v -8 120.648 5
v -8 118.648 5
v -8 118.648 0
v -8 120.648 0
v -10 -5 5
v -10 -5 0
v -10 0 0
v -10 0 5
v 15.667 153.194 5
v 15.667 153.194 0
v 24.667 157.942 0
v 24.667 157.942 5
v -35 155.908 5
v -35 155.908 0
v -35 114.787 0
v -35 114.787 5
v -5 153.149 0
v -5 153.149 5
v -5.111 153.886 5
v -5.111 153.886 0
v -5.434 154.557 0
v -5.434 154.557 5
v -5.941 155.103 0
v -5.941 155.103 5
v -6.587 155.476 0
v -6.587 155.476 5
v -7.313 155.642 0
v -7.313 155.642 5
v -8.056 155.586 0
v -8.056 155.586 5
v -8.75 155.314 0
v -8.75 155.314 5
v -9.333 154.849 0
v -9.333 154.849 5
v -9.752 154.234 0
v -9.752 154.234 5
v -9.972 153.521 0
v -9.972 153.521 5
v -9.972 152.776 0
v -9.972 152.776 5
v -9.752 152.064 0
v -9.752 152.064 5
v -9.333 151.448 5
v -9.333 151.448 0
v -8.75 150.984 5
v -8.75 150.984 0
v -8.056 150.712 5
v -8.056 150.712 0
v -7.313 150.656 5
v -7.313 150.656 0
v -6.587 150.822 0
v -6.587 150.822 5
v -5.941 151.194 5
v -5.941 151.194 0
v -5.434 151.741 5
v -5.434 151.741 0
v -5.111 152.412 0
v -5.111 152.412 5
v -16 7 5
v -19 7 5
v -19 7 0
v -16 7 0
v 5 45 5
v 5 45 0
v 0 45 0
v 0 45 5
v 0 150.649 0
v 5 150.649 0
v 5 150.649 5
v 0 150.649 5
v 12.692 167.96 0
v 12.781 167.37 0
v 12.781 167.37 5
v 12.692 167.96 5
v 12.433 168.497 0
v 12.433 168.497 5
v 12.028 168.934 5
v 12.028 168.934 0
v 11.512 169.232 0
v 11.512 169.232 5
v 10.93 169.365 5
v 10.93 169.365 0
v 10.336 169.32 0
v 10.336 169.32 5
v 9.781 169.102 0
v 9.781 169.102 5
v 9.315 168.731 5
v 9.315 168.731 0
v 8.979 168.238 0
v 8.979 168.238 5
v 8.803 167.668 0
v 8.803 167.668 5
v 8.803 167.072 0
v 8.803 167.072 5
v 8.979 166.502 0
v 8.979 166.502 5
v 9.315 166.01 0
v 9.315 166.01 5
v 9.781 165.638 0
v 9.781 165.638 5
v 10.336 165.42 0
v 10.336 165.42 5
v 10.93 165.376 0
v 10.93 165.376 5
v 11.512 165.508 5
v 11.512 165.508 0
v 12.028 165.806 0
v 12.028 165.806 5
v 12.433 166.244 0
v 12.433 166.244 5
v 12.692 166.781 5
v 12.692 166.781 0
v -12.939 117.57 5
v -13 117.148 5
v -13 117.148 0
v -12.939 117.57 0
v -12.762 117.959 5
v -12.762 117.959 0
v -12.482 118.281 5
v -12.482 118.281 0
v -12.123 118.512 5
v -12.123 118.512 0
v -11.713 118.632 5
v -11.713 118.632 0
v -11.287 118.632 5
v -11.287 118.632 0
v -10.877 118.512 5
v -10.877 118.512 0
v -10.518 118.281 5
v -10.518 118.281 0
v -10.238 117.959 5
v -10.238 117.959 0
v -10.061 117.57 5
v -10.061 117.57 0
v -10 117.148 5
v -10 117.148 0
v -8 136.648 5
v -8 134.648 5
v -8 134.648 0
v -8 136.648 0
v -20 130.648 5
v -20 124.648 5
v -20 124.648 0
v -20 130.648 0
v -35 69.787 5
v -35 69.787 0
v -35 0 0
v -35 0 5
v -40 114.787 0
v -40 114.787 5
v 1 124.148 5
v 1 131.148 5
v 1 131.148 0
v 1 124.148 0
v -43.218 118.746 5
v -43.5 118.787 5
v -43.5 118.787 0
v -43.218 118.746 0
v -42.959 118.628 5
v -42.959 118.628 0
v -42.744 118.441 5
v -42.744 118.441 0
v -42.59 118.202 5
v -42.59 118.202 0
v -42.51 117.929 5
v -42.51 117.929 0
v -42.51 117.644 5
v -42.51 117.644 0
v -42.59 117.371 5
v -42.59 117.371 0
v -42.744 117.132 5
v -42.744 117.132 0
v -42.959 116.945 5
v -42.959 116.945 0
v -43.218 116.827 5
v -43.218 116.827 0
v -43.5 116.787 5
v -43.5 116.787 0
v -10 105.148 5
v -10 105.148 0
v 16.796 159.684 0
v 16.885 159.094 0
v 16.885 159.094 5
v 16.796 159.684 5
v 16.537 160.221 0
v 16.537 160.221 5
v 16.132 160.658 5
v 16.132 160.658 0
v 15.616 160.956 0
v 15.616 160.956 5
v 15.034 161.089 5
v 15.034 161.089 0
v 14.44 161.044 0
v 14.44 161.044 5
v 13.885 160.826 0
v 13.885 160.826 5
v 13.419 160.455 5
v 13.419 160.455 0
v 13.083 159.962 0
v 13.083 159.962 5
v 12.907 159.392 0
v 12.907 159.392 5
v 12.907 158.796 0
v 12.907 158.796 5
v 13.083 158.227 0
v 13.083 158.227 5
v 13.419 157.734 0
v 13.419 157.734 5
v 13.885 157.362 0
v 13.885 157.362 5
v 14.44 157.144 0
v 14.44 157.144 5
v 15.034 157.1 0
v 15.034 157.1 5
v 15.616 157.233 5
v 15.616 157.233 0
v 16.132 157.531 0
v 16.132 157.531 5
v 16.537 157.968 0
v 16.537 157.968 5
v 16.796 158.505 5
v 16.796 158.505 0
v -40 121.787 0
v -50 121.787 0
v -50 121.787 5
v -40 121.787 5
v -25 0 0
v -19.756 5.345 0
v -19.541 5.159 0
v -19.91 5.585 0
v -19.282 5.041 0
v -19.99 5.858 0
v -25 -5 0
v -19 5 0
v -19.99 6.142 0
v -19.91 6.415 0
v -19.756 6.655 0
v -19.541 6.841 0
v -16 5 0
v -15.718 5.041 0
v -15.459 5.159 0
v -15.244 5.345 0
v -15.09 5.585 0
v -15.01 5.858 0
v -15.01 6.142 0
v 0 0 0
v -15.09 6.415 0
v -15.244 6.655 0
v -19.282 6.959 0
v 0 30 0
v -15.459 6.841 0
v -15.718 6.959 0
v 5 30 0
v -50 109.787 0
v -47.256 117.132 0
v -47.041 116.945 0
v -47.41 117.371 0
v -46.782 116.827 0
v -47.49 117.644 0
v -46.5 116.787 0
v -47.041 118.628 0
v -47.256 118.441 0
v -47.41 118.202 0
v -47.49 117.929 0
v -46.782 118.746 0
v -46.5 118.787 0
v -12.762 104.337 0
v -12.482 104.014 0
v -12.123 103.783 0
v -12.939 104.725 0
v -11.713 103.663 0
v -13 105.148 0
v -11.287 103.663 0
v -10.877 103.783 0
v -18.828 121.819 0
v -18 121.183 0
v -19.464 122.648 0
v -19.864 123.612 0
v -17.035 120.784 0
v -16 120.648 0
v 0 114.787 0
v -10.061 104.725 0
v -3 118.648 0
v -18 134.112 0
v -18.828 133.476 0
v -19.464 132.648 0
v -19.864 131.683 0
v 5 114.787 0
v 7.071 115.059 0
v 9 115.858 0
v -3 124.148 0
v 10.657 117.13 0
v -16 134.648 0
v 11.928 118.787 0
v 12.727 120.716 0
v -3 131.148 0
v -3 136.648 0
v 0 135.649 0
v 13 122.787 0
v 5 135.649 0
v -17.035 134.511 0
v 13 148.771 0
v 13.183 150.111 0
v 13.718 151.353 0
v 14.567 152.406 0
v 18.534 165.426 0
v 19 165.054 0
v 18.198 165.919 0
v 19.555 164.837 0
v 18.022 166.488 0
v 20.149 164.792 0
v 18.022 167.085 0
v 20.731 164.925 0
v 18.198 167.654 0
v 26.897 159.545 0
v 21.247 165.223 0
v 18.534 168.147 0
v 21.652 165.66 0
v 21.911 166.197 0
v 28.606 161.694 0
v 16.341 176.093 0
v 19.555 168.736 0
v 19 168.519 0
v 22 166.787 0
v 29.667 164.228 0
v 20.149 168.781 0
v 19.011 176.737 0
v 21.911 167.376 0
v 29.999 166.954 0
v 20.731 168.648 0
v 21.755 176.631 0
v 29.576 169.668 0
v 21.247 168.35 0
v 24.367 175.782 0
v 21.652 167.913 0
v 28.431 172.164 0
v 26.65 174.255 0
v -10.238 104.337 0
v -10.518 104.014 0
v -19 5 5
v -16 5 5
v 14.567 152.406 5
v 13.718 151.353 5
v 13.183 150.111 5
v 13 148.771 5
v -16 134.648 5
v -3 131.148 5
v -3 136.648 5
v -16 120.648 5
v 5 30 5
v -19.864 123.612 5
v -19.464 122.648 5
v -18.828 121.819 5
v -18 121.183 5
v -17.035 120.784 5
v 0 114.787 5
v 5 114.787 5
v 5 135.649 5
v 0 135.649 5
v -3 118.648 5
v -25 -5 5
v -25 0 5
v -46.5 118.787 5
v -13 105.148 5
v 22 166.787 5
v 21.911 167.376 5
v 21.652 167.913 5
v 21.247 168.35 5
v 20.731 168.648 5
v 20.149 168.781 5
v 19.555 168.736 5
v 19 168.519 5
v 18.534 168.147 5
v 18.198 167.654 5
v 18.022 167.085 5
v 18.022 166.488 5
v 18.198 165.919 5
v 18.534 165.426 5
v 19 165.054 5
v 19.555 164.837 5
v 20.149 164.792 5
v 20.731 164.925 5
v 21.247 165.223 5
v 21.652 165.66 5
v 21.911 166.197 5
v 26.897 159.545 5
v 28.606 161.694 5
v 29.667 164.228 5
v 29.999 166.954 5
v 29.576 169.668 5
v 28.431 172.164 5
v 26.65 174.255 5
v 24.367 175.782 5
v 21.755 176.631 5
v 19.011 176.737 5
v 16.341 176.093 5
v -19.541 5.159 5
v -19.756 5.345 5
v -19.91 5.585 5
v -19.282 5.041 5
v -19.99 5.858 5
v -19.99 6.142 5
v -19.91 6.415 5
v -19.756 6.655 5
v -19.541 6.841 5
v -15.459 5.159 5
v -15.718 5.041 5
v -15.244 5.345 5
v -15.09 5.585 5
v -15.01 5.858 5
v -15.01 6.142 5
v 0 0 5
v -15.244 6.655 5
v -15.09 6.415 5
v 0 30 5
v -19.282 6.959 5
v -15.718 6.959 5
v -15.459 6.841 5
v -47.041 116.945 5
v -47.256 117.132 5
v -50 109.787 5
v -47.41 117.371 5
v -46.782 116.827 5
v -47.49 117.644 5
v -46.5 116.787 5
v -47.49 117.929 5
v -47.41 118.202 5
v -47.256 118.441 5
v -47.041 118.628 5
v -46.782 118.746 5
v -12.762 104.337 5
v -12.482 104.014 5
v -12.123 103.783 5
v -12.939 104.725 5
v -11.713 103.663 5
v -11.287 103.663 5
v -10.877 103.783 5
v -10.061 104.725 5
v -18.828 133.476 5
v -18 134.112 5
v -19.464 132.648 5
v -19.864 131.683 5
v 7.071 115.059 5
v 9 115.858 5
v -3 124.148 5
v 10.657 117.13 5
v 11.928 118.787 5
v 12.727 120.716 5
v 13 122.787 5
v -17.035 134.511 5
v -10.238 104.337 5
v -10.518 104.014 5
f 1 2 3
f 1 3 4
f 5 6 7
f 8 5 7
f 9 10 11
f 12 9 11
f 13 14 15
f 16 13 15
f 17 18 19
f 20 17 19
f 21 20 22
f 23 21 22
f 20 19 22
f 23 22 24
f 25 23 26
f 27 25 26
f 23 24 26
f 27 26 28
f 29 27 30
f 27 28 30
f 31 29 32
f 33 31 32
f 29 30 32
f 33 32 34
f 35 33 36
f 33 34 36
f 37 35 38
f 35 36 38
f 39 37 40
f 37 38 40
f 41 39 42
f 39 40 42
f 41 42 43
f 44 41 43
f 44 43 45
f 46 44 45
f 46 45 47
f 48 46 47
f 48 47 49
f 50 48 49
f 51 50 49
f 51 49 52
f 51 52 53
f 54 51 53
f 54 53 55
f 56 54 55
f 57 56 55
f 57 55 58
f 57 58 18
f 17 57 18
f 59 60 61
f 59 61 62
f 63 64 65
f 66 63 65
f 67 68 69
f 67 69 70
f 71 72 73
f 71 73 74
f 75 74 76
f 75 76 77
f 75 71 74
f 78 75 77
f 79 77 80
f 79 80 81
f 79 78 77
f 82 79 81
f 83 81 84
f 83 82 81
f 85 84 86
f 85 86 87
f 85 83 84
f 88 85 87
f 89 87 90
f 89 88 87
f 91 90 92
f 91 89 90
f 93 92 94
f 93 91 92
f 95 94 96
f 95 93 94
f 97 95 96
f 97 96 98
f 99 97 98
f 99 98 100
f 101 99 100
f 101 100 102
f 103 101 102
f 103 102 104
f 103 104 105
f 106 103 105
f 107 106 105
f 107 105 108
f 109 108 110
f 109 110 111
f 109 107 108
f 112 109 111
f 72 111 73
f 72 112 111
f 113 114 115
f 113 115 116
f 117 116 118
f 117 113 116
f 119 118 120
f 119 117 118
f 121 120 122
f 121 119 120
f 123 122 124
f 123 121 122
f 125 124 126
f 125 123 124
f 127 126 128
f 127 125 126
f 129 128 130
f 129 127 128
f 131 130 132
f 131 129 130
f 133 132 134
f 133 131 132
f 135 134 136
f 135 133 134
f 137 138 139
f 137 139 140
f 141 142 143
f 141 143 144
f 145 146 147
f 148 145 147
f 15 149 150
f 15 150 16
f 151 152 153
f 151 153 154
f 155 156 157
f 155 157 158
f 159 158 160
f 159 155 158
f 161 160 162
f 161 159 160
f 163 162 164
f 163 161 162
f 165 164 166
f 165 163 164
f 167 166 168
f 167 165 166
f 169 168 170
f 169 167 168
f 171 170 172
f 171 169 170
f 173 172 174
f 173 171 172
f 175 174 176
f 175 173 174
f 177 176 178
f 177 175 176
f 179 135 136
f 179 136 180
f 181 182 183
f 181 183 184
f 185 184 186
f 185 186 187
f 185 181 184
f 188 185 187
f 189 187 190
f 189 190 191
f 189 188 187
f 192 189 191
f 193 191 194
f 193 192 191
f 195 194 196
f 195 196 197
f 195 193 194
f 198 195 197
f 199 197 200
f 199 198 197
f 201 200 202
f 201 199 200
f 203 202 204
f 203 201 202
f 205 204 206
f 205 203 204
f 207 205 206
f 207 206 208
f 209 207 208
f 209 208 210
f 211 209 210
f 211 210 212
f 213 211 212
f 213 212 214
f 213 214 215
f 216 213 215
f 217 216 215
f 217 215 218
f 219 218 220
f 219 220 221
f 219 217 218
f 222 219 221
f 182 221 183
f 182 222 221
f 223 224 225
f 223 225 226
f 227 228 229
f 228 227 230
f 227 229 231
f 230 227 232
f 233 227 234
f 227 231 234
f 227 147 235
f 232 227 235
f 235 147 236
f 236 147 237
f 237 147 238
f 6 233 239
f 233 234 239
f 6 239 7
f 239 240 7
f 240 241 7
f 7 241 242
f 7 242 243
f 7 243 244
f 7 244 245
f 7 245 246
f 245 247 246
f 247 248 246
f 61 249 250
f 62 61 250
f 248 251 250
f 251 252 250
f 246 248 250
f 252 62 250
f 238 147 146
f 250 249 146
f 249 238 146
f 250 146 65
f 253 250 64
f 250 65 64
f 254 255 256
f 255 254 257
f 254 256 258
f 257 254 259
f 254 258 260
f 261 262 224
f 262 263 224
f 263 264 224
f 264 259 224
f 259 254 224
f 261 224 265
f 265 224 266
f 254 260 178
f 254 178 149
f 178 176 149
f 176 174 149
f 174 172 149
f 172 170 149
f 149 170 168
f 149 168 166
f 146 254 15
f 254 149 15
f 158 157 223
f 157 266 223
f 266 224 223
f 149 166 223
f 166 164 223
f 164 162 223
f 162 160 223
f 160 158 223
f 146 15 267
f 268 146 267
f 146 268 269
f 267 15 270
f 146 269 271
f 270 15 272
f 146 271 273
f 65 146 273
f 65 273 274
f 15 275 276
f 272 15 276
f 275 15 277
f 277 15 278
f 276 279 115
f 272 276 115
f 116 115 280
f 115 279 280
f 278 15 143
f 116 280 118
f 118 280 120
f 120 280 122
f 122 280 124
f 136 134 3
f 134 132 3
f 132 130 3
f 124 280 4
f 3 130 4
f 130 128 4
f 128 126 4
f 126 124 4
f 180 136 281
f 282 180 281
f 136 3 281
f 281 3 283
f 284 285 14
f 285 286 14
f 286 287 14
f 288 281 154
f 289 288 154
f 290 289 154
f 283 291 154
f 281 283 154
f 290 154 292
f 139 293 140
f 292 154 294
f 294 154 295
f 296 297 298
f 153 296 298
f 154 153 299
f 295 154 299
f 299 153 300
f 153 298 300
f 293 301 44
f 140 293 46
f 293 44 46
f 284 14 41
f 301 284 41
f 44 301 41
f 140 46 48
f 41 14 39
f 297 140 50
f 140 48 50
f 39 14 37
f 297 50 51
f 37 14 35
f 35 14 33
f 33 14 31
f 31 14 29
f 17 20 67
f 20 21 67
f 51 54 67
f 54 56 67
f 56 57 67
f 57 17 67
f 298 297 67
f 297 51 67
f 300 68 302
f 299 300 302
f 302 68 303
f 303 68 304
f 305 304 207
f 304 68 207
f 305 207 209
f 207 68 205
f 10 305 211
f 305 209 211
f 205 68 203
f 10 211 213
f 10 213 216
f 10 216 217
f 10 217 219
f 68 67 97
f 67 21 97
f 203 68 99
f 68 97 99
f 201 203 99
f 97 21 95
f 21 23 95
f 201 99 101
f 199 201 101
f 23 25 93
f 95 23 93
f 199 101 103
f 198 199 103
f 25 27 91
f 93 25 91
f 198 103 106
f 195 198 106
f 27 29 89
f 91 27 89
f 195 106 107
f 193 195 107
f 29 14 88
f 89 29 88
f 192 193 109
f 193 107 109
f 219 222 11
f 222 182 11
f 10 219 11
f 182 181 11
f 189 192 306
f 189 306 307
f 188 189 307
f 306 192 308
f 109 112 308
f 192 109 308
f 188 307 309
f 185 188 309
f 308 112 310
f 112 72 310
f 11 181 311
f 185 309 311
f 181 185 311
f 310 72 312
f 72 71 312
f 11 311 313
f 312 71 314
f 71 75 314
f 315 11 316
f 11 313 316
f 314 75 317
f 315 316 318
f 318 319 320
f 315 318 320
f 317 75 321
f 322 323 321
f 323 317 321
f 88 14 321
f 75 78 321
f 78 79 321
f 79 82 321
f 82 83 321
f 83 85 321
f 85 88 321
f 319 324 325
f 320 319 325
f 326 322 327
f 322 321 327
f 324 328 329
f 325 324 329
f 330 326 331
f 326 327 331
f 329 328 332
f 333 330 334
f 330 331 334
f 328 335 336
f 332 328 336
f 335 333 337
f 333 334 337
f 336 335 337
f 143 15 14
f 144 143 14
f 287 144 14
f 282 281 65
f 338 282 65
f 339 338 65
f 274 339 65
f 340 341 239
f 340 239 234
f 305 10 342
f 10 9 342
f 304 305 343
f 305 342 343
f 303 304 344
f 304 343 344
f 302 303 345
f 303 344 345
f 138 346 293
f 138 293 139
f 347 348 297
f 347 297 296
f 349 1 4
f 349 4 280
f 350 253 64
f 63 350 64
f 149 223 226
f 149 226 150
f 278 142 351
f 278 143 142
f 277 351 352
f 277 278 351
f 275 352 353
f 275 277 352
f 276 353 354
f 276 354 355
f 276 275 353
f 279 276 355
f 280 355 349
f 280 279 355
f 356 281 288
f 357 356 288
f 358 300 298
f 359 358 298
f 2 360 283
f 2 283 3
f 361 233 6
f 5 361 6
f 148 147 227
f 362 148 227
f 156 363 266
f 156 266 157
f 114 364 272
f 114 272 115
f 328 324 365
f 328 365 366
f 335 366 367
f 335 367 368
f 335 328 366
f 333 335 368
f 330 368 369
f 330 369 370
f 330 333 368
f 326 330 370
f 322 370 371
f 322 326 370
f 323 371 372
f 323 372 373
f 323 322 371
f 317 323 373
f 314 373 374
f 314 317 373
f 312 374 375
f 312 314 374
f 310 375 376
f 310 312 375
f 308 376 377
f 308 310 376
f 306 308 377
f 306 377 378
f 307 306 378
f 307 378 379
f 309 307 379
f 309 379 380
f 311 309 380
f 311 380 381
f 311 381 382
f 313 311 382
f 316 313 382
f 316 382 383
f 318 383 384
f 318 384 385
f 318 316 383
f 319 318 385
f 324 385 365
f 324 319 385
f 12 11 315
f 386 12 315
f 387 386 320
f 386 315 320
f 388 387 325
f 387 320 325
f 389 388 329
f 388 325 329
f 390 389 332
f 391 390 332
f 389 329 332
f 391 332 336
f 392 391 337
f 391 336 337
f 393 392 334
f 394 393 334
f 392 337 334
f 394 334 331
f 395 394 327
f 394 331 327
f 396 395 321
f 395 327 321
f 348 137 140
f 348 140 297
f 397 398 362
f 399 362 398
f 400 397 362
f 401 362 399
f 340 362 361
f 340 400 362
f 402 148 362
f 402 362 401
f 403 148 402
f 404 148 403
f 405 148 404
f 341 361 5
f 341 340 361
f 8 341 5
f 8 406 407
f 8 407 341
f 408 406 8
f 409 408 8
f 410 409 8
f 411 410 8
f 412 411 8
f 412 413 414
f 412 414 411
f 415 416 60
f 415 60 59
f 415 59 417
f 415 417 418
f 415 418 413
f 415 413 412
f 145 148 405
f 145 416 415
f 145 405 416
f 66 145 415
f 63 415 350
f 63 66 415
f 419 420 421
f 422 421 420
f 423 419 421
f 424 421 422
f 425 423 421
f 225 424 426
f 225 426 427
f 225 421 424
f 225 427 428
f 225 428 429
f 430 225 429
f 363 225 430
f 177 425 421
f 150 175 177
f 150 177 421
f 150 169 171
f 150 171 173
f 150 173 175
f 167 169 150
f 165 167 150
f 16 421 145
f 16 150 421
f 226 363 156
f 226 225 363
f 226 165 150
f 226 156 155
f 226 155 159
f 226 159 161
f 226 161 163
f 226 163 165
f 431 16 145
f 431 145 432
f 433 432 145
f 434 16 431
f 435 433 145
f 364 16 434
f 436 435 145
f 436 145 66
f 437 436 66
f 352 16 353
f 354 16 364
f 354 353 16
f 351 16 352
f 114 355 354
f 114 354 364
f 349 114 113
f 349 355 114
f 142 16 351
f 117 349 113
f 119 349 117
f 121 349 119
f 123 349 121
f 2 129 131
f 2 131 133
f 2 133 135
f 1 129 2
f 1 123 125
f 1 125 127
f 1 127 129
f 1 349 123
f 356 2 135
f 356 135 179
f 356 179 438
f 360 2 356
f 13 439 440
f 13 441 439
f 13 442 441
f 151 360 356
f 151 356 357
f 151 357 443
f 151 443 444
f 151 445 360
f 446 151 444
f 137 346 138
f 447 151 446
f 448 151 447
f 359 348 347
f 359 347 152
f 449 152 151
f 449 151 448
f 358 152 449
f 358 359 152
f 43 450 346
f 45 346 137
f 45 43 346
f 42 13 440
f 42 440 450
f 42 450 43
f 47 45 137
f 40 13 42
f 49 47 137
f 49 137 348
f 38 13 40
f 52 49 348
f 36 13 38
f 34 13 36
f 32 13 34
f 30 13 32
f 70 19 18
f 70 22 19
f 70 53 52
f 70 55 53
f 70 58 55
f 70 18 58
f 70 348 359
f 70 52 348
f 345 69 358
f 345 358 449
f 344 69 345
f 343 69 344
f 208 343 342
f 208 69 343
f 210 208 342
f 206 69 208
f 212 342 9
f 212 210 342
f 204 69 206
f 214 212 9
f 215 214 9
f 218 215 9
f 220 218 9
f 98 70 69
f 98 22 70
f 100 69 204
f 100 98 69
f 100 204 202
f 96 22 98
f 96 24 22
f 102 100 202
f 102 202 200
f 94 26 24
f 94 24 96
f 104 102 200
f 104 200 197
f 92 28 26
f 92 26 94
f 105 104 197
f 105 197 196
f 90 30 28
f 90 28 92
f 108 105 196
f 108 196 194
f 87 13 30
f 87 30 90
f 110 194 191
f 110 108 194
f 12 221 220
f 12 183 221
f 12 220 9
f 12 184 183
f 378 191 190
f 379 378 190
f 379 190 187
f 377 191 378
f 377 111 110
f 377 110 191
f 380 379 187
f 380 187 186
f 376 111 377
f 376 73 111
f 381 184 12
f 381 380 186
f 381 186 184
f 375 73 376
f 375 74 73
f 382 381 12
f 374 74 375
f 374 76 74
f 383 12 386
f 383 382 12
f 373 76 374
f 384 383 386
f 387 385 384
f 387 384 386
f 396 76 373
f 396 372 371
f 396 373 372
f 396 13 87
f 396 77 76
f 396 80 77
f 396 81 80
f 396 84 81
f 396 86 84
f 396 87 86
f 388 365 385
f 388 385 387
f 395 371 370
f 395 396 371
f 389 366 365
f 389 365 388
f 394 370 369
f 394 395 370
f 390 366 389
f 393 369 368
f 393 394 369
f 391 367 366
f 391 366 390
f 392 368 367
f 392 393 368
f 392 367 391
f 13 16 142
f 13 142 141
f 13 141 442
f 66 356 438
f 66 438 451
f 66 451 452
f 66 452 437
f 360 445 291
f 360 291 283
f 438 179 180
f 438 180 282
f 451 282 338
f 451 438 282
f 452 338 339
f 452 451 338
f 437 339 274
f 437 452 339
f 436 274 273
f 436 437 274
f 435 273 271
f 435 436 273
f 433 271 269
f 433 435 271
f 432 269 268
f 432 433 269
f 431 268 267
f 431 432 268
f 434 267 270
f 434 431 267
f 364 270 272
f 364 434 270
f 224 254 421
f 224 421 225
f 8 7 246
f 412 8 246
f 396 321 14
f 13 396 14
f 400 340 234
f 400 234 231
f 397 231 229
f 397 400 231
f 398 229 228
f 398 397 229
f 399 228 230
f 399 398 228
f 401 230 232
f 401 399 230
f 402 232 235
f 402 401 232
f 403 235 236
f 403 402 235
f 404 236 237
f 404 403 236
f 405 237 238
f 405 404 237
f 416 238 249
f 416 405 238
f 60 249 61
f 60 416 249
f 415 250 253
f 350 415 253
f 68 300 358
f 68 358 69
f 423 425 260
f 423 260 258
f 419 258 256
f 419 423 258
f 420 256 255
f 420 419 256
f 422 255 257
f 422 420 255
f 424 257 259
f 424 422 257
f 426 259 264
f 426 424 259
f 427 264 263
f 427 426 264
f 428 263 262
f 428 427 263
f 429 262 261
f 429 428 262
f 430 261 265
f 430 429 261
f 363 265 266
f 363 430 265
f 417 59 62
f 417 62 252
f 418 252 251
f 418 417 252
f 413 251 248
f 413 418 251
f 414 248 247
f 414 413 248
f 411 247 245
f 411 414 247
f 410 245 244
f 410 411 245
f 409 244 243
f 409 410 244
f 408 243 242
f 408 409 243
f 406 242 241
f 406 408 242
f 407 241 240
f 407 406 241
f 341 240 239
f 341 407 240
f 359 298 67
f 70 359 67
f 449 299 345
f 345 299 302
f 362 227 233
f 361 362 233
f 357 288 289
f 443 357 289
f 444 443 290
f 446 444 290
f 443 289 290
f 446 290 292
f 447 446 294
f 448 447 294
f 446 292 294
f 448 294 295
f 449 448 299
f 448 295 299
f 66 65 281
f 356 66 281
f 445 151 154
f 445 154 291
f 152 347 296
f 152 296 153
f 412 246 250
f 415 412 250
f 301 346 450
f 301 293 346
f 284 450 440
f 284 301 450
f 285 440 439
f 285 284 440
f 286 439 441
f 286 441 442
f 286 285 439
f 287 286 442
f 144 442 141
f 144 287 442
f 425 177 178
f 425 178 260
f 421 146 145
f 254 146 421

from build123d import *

# Parameters (mm, degrees)
SKETCH2_R           = 2
BOSS_EXTRUDE1_DEPTH = 5
SKETCH3_R           = 2.5
CUT_EXTRUDE1_DEPTH  = 181.287193762
BOSS_EXTRUDE2_DEPTH = 5
FILLET1_R           = 5
CUT_EXTRUDE2_DEPTH  = 184.789205979
SKETCH6_W           = 5
SKETCH6_H           = 15
CUT_EXTRUDE3_DEPTH  = 184.789205979
FILLET2_R           = 4


with BuildPart() as part:
    # Sketch2 → Boss-Extrude1 (new body)
    with BuildSketch(Plane.XY):
        with BuildLine():
            Line((16.34105486, 176.093079286), (-35, 155.907958626))
            Line((-35, 155.907958626), (-35, 0))
            Line((-35, 0), (-25, 0))
            Line((-25, 0), (-25, -5))
            Line((-25, -5), (-10, -5))
            Line((-10, -5), (-10, 0))
            Line((-10, 0), (0, 0))
            Line((0, 0), (0, 30))
            Line((0, 30), (5, 30))
            Line((5, 30), (5, 45))
            Line((5, 45), (0, 45))
            Line((0, 45), (0, 114.786515986))
            Line((0, 114.786515986), (5, 114.786515986))
            ThreePointArc((5, 114.786515986), (10.656854249, 117.129661736), (13, 122.786515986))
            Line((13, 122.786515986), (13, 151.786515986))
            Line((13, 151.786515986), (24.666554357, 157.942123953))
            ThreePointArc((24.666554357, 157.942123953), (29.089450696, 170.955674898), (16.34105486, 176.093079286))
        make_face()
        with Locations((20, 166.786515986)):
            Circle(SKETCH2_R, mode=Mode.SUBTRACT)
        with Locations((10.78085199, 167.370162539)):
            Circle(SKETCH2_R, mode=Mode.SUBTRACT)
        with Locations((14.884973253, 159.094322884)):
            Circle(SKETCH2_R, mode=Mode.SUBTRACT)
    extrude(amount=BOSS_EXTRUDE1_DEPTH)

    # Sketch3 → Cut-Extrude1 (cut, through all)
    with BuildSketch(Plane.XY.offset(5)):
        with Locations((-7.5, 153.1488261)):
            Circle(SKETCH3_R)
        Polygon((-3, 136.647544915), (-3, 131.147544915), (1, 131.147544915), (1, 124.147544915), (-3, 124.147544915), (-3, 118.647544915), (-8, 118.647544915), (-8, 120.647544915), (-20, 120.647544915), (-20, 134.647544915), (-8, 134.647544915), (-8, 136.647544915), align=None)
    extrude(amount=-CUT_EXTRUDE1_DEPTH, mode=Mode.SUBTRACT)

    # Sketch4 → Boss-Extrude2 (add)
    with BuildSketch(Plane(origin=(0, 0, 0), x_dir=(-1, 0, 0), z_dir=(0, 0, -1))):
        Polygon((40, 114.786515986), (35, 114.786515986), (35, 69.786515986), (50, 109.786515986), (50, 121.786515986), (40, 121.786515986), align=None)
    extrude(amount=-BOSS_EXTRUDE2_DEPTH)

    # Fillet1
    fillet1_edges = [part.edges().sort_by_distance(p)[0] for p in [
        (13, 151.786515986, 2.5),
    ]]
    fillet(fillet1_edges, radius=FILLET1_R)

    # Sketch5 → Cut-Extrude2 (cut, through all)
    with BuildSketch(Plane.XY.offset(5)):
        with BuildLine():
            Line((-10, 117.147544915), (-10, 105.147544915))
            ThreePointArc((-10, 105.147544915), (-11.5, 103.647544915), (-13, 105.147544915))
            Line((-13, 105.147544915), (-13, 117.147544915))
            ThreePointArc((-13, 117.147544915), (-11.5, 118.647544915), (-10, 117.147544915))
        make_face()
        with BuildLine():
            Line((-43.5, 116.786515986), (-46.5, 116.786515986))
            ThreePointArc((-46.5, 116.786515986), (-47.5, 117.786515986), (-46.5, 118.786515986))
            Line((-46.5, 118.786515986), (-43.5, 118.786515986))
            ThreePointArc((-43.5, 118.786515986), (-42.5, 117.786515986), (-43.5, 116.786515986))
        make_face()
        with BuildLine():
            Line((-19, 7), (-16, 7))
            ThreePointArc((-16, 7), (-15, 6), (-16, 5))
            Line((-16, 5), (-19, 5))
            ThreePointArc((-19, 5), (-20, 6), (-19, 7))
        make_face()
    extrude(amount=-CUT_EXTRUDE2_DEPTH, mode=Mode.SUBTRACT)

    # Sketch6 → Cut-Extrude3 (cut, through all)
    with BuildSketch(Plane(origin=(0, 0, 0), x_dir=(-1, 0, 0), z_dir=(0, 0, -1))):
        with Locations((-2.5, 143.148799484)):
            Rectangle(SKETCH6_W, SKETCH6_H)
    extrude(amount=-CUT_EXTRUDE3_DEPTH, mode=Mode.SUBTRACT)

    # Fillet2
    fillet2_edges = [part.edges().sort_by_distance(p)[0] for p in [
        (-20, 134.647544915, 2.5),
        (-20, 120.647544915, 2.5),
    ]]
    fillet(fillet2_edges, radius=FILLET2_R)


solid = part.part
